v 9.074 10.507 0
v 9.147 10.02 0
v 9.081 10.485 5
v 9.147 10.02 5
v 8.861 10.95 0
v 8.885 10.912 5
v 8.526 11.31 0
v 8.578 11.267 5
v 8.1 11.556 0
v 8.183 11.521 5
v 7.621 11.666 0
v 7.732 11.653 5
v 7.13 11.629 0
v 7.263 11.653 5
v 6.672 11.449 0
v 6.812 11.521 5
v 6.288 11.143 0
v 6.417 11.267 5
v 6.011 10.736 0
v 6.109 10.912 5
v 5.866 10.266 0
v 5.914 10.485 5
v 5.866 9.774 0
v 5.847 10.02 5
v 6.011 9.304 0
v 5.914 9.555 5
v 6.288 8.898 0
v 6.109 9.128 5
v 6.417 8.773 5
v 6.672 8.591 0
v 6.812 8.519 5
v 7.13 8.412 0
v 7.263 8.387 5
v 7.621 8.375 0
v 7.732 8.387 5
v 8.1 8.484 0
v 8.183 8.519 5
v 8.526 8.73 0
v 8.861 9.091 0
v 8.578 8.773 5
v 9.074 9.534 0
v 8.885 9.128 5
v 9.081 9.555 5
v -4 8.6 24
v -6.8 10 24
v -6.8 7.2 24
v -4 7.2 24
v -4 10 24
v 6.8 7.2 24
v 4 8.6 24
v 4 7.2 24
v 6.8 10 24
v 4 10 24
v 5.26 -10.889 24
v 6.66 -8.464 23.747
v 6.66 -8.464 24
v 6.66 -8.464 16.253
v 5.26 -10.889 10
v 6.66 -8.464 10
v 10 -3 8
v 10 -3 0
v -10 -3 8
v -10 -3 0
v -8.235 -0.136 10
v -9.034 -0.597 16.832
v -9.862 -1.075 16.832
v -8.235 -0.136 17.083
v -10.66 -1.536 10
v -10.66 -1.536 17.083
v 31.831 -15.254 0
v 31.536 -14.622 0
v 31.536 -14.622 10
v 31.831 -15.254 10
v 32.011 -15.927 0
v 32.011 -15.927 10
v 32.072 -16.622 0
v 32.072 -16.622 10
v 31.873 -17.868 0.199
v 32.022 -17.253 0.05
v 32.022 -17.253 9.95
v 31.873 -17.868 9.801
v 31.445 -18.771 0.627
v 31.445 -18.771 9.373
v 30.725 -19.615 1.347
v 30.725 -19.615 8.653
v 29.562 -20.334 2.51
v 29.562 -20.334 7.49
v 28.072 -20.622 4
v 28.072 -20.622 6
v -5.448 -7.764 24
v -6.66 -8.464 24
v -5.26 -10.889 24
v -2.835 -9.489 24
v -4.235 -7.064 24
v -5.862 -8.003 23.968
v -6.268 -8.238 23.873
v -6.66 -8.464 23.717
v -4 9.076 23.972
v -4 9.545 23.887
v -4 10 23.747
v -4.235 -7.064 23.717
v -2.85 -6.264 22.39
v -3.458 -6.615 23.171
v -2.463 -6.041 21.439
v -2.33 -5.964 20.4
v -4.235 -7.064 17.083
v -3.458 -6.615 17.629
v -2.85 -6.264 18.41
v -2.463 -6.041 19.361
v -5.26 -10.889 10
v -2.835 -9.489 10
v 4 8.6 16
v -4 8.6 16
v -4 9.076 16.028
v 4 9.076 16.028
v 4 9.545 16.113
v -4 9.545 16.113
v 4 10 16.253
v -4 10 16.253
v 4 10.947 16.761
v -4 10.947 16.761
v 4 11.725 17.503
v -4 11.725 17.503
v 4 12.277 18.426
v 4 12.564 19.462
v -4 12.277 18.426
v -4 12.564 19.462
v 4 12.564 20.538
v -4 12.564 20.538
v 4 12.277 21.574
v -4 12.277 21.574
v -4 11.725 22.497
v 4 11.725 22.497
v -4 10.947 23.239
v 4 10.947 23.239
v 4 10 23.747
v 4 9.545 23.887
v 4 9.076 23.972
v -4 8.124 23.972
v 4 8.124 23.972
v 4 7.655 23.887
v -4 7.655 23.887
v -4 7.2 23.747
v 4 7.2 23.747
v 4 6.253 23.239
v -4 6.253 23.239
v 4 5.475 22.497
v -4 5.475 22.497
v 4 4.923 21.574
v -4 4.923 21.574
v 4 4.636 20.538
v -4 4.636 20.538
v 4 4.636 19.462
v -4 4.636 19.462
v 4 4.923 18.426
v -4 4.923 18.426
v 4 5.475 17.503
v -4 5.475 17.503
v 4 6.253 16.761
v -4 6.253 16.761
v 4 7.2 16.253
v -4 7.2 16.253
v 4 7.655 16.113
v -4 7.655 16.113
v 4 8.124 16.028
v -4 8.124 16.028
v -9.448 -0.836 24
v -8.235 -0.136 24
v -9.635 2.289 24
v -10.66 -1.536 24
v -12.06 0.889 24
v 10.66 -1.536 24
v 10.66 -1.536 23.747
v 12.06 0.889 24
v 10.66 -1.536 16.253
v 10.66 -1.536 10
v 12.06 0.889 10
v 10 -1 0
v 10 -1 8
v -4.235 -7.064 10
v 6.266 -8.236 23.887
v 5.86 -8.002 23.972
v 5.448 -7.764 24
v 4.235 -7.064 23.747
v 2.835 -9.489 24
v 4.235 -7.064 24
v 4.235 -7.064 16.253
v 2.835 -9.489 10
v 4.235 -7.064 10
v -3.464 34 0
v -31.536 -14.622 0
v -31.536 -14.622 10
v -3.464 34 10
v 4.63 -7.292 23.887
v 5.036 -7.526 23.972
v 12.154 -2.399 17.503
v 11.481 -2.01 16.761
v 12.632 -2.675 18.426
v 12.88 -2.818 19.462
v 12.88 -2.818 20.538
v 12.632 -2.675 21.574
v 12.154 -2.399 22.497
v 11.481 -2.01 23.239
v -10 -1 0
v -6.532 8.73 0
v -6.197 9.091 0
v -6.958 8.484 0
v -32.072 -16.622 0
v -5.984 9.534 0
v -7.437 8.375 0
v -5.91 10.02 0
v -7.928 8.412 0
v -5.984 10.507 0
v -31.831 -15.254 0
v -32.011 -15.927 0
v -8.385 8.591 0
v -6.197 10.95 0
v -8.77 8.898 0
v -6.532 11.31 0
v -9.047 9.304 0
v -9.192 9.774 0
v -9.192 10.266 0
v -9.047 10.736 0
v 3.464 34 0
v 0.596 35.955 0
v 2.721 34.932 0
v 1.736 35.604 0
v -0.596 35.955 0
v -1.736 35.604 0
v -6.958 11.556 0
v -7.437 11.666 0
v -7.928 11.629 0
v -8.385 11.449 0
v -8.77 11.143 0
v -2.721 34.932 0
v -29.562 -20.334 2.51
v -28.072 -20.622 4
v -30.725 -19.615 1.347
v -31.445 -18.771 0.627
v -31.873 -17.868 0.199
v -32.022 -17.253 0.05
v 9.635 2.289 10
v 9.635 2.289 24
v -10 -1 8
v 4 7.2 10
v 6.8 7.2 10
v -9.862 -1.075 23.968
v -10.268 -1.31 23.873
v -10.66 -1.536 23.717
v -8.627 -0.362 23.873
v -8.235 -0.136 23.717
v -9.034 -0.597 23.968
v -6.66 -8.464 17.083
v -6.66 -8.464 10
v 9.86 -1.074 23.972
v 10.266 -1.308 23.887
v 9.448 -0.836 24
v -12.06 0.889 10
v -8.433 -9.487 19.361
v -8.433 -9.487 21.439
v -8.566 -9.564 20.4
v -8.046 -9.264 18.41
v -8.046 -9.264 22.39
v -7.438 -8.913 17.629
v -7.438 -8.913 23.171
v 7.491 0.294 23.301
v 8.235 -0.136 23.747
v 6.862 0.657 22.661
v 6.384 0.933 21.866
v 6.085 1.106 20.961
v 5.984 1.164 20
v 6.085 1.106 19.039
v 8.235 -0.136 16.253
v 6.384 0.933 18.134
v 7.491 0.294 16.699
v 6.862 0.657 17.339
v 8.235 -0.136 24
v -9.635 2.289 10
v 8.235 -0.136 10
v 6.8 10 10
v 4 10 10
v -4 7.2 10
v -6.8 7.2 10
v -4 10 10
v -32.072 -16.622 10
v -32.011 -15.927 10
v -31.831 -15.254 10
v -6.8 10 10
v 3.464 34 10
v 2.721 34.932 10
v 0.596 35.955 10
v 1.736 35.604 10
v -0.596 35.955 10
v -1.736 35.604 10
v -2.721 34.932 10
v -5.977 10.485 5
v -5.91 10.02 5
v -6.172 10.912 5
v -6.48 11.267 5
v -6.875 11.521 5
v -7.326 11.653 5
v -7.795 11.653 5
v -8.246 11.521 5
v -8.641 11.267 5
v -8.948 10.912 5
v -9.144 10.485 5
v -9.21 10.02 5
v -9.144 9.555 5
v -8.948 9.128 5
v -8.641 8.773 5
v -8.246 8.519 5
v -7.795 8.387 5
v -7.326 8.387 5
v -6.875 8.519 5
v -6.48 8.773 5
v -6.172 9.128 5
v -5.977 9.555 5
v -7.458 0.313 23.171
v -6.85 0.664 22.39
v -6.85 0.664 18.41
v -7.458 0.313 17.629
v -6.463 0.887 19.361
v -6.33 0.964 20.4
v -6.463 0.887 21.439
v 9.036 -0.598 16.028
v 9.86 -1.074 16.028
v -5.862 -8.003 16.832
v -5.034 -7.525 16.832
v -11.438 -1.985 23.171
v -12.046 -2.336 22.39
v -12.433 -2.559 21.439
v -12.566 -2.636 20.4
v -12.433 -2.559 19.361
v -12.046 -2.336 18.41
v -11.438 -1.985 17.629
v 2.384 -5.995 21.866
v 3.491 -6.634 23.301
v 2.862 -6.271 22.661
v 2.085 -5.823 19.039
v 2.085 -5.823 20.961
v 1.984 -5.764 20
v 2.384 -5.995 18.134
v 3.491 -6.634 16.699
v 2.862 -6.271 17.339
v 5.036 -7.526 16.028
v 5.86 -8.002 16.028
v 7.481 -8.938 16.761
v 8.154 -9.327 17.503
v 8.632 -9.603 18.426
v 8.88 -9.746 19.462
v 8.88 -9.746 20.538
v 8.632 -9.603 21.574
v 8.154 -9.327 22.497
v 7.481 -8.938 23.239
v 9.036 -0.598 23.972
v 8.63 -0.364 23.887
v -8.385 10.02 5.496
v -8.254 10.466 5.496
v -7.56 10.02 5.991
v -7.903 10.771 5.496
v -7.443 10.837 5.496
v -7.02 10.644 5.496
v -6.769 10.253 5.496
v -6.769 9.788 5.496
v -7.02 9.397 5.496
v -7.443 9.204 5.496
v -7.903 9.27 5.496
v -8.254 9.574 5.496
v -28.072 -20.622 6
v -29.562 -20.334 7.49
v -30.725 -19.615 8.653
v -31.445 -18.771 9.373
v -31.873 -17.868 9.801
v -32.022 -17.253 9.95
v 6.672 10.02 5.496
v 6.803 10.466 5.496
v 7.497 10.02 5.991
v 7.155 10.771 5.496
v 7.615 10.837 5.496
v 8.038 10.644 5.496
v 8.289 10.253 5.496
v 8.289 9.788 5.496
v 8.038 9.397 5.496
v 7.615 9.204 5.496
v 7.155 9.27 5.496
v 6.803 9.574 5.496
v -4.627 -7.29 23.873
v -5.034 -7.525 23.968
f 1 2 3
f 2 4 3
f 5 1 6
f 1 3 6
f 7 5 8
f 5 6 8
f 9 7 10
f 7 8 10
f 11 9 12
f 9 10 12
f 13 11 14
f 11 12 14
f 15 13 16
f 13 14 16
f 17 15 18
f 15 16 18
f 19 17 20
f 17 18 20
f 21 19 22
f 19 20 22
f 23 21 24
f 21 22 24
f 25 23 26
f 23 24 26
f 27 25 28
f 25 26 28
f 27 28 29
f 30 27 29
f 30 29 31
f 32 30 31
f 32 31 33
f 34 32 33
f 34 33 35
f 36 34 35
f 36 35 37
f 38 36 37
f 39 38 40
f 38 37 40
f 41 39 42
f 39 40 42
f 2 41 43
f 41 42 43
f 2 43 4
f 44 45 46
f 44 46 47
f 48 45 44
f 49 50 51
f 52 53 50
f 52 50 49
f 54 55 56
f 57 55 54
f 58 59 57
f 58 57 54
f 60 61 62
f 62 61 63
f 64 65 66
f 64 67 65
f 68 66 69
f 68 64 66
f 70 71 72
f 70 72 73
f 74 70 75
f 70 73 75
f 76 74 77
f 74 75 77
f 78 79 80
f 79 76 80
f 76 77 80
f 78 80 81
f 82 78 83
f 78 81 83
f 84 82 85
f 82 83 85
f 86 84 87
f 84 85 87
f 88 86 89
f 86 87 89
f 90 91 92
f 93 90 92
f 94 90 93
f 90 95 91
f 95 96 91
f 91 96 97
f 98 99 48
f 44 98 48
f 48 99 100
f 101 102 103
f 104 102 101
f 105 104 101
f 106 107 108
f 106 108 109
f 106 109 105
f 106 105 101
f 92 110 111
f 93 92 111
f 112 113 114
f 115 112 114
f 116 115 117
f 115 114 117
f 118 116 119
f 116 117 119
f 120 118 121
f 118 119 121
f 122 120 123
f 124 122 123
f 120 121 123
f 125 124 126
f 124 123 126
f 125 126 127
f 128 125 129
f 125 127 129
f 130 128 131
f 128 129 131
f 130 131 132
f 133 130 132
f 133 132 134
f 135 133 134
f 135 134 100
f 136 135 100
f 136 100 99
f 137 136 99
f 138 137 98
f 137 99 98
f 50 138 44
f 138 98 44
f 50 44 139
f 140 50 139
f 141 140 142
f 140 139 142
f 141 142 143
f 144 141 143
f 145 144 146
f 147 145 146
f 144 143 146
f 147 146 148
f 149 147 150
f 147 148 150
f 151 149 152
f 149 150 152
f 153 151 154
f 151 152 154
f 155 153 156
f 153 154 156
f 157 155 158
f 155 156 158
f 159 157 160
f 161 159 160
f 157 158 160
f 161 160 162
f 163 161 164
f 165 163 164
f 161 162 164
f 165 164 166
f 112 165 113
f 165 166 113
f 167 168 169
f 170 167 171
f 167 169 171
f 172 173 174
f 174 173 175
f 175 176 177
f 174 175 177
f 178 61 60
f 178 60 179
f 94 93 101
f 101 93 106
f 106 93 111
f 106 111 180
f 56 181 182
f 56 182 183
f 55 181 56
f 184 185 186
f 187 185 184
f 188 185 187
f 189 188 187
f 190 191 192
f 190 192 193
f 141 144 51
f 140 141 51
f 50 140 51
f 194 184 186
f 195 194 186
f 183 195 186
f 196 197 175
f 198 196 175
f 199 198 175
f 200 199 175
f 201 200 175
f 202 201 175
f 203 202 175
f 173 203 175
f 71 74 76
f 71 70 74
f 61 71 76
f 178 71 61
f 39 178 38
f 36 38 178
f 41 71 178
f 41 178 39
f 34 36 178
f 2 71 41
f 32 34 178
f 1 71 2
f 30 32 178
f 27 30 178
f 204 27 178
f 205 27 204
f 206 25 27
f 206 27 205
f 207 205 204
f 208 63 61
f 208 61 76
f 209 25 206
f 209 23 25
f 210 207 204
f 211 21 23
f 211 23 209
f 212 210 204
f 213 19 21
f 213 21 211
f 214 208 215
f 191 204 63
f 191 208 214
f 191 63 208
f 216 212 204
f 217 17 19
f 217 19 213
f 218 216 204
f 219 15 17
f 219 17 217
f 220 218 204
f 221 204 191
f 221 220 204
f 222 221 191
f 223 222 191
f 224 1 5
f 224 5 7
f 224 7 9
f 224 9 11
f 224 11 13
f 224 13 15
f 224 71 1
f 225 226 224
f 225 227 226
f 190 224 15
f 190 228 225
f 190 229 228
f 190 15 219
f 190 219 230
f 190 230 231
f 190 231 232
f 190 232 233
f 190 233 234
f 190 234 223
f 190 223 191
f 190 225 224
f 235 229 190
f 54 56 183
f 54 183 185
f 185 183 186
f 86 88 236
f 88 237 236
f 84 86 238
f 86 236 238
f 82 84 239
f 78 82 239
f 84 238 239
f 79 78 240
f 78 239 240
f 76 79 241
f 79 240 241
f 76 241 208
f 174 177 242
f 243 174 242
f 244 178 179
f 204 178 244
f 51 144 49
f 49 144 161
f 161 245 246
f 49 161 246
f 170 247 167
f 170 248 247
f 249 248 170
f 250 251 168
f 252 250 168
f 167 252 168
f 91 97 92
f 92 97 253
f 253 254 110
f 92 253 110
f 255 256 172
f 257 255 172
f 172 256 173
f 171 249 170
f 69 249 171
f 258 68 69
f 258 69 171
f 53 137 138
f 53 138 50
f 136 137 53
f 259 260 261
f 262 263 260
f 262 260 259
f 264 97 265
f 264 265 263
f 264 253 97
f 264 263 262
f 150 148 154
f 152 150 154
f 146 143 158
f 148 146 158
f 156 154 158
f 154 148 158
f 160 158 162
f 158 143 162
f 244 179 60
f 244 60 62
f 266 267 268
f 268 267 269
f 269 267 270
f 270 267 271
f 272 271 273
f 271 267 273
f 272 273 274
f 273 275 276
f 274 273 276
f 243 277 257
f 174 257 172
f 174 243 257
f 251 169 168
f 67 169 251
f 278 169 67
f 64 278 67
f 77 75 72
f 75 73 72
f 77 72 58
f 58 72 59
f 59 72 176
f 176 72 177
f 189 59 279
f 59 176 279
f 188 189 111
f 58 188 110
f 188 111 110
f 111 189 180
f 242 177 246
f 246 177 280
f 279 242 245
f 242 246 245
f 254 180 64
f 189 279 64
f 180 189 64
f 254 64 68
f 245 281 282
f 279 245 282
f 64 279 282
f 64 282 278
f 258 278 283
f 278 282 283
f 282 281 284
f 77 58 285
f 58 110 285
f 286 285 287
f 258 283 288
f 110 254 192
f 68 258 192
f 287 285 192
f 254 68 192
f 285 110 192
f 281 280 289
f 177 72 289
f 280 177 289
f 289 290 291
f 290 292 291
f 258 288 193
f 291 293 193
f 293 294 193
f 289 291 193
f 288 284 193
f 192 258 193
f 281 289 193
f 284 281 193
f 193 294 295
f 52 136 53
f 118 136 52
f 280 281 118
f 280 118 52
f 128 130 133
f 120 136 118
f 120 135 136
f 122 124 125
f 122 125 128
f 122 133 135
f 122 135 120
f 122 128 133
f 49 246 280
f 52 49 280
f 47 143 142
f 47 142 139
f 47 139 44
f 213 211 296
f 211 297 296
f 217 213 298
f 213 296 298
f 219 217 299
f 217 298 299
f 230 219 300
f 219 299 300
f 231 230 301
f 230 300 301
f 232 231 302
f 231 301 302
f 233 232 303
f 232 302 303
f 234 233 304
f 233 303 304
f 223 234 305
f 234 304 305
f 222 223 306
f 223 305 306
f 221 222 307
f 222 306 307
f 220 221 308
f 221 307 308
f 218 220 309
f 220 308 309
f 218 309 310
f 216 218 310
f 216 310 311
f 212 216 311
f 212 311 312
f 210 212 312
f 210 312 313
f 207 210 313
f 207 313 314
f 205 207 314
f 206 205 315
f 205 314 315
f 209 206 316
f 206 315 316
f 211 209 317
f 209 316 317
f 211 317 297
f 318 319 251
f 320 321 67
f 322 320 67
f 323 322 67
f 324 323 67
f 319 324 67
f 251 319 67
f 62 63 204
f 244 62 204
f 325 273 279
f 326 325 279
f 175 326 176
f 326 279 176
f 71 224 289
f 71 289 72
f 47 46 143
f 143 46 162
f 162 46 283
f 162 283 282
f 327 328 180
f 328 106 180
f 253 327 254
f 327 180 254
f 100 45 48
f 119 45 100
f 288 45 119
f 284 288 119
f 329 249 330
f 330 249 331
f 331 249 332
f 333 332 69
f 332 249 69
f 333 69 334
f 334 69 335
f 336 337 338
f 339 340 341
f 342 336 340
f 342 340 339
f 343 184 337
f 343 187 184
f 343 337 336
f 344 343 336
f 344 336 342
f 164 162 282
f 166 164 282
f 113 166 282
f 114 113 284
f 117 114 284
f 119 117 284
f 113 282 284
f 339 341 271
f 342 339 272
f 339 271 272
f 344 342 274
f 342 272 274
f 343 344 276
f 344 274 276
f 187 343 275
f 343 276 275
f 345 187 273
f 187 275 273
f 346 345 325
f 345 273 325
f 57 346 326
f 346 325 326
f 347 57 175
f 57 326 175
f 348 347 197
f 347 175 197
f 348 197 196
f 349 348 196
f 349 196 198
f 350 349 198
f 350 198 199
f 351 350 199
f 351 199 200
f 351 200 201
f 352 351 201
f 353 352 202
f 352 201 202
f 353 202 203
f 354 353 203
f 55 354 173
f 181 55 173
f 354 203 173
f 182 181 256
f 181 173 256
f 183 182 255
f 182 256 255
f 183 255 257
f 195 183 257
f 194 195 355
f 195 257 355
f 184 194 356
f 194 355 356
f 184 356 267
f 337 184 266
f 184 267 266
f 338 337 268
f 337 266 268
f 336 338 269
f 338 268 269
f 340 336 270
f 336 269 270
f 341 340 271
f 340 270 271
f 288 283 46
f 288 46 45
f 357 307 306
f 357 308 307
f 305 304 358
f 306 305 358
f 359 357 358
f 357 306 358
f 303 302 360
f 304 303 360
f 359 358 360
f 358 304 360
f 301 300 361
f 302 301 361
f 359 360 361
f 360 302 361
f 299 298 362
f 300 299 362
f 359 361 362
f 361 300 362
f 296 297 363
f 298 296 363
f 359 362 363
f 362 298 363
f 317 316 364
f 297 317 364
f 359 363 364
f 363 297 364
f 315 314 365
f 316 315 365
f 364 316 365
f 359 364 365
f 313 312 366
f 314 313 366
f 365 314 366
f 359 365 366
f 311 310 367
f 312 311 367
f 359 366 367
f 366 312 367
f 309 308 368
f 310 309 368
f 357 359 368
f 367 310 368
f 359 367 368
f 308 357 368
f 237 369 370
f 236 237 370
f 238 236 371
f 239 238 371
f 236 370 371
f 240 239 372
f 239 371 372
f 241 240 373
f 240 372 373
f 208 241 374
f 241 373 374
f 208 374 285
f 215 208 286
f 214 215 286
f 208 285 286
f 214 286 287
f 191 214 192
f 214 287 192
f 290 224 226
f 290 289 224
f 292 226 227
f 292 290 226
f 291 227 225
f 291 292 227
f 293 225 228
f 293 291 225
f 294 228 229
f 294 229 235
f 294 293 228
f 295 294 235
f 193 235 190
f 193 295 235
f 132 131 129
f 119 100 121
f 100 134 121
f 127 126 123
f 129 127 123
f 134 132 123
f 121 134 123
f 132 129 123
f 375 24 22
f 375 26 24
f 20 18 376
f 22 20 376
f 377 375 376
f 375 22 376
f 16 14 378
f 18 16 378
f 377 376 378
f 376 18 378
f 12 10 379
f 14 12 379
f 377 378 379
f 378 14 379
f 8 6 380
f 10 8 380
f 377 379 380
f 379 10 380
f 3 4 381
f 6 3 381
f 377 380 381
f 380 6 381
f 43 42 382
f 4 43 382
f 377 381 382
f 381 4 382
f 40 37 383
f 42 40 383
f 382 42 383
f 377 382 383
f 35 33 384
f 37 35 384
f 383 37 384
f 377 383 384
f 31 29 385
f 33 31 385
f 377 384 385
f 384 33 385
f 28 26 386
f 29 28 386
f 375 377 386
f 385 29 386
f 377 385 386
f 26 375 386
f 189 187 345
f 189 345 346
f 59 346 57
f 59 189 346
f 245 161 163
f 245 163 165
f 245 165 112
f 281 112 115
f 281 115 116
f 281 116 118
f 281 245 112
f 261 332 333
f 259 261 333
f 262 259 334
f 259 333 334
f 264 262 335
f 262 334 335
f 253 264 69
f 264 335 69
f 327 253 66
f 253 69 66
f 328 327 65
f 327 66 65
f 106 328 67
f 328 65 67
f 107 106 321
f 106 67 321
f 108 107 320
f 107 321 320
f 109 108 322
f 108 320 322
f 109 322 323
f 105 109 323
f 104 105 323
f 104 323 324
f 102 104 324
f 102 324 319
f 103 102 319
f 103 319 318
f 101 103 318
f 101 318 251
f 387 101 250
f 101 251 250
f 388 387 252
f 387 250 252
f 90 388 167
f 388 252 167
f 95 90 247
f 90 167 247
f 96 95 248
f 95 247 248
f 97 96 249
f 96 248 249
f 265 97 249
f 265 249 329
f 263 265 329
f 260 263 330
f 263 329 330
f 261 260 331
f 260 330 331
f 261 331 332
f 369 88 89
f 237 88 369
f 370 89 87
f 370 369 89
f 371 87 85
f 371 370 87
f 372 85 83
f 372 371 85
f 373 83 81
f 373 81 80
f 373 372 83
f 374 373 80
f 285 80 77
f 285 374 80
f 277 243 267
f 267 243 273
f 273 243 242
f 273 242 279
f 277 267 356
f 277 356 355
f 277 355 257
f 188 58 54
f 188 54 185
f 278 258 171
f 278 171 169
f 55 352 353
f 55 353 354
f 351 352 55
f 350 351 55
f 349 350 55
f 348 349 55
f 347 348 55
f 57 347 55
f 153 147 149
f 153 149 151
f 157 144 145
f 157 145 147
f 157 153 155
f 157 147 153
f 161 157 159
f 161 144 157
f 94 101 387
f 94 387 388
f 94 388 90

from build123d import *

# Parameters (mm, degrees)
EXTRUDE_1_DEPTH        = 10
FILLET_1_R             = 4
SKETCH_2_W             = 2.8
SKETCH_2_H             = 2.8
EXTRUDE_2_DEPTH        = 14
SKETCH_3_R             = 3.6
EXTRUDE_3_DEPTH        = 8
SKETCH_4_R             = 4
EXTRUDE_4_DEPTH        = 8
SKETCH_5_R             = 4
EXTRUDE_5_DEPTH        = 8
SKETCH_6_W             = 20
SKETCH_6_H             = 2
CUT_EXTRUDE_1_DEPTH    = 8
HOLE_WIZARD_M4_1_D     = 3.3
HOLE_WIZARD_M4_1_DEPTH = 5
HOLE_WIZARD_M4_1_TIP   = 0.991420021


with BuildPart() as part:
    # 草图1 → 凸台-拉伸1 (new body)
    with BuildSketch(Plane.XY):
        Polygon((0, 40), (35, -20.621778265), (-35, -20.621778265), align=None)
    extrude(amount=EXTRUDE_1_DEPTH)

    # 圆角1
    fillet_1_edges = [part.edges().sort_by_distance(p)[0] for p in [
        (0, -20.621778265, 10),
        (0, -20.621778265, 0),
        (35, -20.621778265, 5),
        (-35, -20.621778265, 5),
        (0, 40, 5),
    ]]
    fillet(fillet_1_edges, radius=FILLET_1_R)

    # 草图2 → 凸台-拉伸2 (add)
    with BuildSketch(Plane.XY.offset(10)):
        with Locations((-5.4, 8.6)):
            Rectangle(SKETCH_2_W, SKETCH_2_H)
        with Locations((5.4, 8.6)):
            Rectangle(SKETCH_2_W, SKETCH_2_H)
        Polygon((10.660254038, -1.535898385), (12.060254038, 0.888972746), (9.635382907, 2.288972746), (8.235382907, -0.135898385), align=None)
        Polygon((5.260254038, -10.888972746), (2.835382907, -9.488972746), (4.235382907, -7.064101615), (6.660254038, -8.464101615), align=None)
        Polygon((-6.660254038, -8.464101615), (-5.260254038, -10.888972746), (-2.835382907, -9.488972746), (-4.235382907, -7.064101615), align=None)
        Polygon((-12.060254038, 0.888972746), (-9.635382907, 2.288972746), (-8.235382907, -0.135898385), (-10.660254038, -1.535898385), align=None)
    extrude(amount=EXTRUDE_2_DEPTH)

    # 草图3 → 凸台-拉伸3 (add)
    with BuildSketch(Plane(origin=(-2, 3.464101615, 0), x_dir=(-0.866025404, -0.5, 0), z_dir=(0.5, -0.866025404, 0))):
        with Locations((8.6, -20.4)):
            Circle(SKETCH_3_R)
    extrude(amount=EXTRUDE_3_DEPTH)

    # 草图4 → 凸台-拉伸4 (add)
    with BuildSketch(Plane(origin=(-4, 0, 0), x_dir=(0, 0, -1), z_dir=(1, 0, 0))):
        with Locations((-20, 8.6)):
            Circle(SKETCH_4_R)
    extrude(amount=EXTRUDE_4_DEPTH)

    # 草图5 → 凸台-拉伸5 (add)
    with BuildSketch(Plane(origin=(2, 3.464101615, 0), x_dir=(-0.866025404, 0.5, 0), z_dir=(-0.5, -0.866025404, 0))):
        with Locations((-8.6, -20)):
            Circle(SKETCH_5_R)
    extrude(amount=EXTRUDE_5_DEPTH)

    # 草图6 → 切除-拉伸1 (cut)
    with BuildSketch(Plane(origin=(0, 0, 0), x_dir=(-1, 0, 0), z_dir=(0, 0, -1))):
        with Locations((0, -2)):
            Rectangle(SKETCH_6_W, SKETCH_6_H)
    extrude(amount=-CUT_EXTRUDE_1_DEPTH, mode=Mode.SUBTRACT)

    # M4 螺纹孔1
    with Locations(Plane(origin=(0, 0, 0), x_dir=(-1, 0, 0), z_dir=(0, 0, -1))):
        with Locations((-7.497367874, 10.020225249), (7.560370965, 10.020225249)):
            Hole(HOLE_WIZARD_M4_1_D / 2, depth=HOLE_WIZARD_M4_1_DEPTH)
            with Locations((0, 0, -(HOLE_WIZARD_M4_1_DEPTH + HOLE_WIZARD_M4_1_TIP / 2))):  # 118° drill point
                Cone(0, HOLE_WIZARD_M4_1_D / 2, HOLE_WIZARD_M4_1_TIP, mode=Mode.SUBTRACT)


solid = part.part
